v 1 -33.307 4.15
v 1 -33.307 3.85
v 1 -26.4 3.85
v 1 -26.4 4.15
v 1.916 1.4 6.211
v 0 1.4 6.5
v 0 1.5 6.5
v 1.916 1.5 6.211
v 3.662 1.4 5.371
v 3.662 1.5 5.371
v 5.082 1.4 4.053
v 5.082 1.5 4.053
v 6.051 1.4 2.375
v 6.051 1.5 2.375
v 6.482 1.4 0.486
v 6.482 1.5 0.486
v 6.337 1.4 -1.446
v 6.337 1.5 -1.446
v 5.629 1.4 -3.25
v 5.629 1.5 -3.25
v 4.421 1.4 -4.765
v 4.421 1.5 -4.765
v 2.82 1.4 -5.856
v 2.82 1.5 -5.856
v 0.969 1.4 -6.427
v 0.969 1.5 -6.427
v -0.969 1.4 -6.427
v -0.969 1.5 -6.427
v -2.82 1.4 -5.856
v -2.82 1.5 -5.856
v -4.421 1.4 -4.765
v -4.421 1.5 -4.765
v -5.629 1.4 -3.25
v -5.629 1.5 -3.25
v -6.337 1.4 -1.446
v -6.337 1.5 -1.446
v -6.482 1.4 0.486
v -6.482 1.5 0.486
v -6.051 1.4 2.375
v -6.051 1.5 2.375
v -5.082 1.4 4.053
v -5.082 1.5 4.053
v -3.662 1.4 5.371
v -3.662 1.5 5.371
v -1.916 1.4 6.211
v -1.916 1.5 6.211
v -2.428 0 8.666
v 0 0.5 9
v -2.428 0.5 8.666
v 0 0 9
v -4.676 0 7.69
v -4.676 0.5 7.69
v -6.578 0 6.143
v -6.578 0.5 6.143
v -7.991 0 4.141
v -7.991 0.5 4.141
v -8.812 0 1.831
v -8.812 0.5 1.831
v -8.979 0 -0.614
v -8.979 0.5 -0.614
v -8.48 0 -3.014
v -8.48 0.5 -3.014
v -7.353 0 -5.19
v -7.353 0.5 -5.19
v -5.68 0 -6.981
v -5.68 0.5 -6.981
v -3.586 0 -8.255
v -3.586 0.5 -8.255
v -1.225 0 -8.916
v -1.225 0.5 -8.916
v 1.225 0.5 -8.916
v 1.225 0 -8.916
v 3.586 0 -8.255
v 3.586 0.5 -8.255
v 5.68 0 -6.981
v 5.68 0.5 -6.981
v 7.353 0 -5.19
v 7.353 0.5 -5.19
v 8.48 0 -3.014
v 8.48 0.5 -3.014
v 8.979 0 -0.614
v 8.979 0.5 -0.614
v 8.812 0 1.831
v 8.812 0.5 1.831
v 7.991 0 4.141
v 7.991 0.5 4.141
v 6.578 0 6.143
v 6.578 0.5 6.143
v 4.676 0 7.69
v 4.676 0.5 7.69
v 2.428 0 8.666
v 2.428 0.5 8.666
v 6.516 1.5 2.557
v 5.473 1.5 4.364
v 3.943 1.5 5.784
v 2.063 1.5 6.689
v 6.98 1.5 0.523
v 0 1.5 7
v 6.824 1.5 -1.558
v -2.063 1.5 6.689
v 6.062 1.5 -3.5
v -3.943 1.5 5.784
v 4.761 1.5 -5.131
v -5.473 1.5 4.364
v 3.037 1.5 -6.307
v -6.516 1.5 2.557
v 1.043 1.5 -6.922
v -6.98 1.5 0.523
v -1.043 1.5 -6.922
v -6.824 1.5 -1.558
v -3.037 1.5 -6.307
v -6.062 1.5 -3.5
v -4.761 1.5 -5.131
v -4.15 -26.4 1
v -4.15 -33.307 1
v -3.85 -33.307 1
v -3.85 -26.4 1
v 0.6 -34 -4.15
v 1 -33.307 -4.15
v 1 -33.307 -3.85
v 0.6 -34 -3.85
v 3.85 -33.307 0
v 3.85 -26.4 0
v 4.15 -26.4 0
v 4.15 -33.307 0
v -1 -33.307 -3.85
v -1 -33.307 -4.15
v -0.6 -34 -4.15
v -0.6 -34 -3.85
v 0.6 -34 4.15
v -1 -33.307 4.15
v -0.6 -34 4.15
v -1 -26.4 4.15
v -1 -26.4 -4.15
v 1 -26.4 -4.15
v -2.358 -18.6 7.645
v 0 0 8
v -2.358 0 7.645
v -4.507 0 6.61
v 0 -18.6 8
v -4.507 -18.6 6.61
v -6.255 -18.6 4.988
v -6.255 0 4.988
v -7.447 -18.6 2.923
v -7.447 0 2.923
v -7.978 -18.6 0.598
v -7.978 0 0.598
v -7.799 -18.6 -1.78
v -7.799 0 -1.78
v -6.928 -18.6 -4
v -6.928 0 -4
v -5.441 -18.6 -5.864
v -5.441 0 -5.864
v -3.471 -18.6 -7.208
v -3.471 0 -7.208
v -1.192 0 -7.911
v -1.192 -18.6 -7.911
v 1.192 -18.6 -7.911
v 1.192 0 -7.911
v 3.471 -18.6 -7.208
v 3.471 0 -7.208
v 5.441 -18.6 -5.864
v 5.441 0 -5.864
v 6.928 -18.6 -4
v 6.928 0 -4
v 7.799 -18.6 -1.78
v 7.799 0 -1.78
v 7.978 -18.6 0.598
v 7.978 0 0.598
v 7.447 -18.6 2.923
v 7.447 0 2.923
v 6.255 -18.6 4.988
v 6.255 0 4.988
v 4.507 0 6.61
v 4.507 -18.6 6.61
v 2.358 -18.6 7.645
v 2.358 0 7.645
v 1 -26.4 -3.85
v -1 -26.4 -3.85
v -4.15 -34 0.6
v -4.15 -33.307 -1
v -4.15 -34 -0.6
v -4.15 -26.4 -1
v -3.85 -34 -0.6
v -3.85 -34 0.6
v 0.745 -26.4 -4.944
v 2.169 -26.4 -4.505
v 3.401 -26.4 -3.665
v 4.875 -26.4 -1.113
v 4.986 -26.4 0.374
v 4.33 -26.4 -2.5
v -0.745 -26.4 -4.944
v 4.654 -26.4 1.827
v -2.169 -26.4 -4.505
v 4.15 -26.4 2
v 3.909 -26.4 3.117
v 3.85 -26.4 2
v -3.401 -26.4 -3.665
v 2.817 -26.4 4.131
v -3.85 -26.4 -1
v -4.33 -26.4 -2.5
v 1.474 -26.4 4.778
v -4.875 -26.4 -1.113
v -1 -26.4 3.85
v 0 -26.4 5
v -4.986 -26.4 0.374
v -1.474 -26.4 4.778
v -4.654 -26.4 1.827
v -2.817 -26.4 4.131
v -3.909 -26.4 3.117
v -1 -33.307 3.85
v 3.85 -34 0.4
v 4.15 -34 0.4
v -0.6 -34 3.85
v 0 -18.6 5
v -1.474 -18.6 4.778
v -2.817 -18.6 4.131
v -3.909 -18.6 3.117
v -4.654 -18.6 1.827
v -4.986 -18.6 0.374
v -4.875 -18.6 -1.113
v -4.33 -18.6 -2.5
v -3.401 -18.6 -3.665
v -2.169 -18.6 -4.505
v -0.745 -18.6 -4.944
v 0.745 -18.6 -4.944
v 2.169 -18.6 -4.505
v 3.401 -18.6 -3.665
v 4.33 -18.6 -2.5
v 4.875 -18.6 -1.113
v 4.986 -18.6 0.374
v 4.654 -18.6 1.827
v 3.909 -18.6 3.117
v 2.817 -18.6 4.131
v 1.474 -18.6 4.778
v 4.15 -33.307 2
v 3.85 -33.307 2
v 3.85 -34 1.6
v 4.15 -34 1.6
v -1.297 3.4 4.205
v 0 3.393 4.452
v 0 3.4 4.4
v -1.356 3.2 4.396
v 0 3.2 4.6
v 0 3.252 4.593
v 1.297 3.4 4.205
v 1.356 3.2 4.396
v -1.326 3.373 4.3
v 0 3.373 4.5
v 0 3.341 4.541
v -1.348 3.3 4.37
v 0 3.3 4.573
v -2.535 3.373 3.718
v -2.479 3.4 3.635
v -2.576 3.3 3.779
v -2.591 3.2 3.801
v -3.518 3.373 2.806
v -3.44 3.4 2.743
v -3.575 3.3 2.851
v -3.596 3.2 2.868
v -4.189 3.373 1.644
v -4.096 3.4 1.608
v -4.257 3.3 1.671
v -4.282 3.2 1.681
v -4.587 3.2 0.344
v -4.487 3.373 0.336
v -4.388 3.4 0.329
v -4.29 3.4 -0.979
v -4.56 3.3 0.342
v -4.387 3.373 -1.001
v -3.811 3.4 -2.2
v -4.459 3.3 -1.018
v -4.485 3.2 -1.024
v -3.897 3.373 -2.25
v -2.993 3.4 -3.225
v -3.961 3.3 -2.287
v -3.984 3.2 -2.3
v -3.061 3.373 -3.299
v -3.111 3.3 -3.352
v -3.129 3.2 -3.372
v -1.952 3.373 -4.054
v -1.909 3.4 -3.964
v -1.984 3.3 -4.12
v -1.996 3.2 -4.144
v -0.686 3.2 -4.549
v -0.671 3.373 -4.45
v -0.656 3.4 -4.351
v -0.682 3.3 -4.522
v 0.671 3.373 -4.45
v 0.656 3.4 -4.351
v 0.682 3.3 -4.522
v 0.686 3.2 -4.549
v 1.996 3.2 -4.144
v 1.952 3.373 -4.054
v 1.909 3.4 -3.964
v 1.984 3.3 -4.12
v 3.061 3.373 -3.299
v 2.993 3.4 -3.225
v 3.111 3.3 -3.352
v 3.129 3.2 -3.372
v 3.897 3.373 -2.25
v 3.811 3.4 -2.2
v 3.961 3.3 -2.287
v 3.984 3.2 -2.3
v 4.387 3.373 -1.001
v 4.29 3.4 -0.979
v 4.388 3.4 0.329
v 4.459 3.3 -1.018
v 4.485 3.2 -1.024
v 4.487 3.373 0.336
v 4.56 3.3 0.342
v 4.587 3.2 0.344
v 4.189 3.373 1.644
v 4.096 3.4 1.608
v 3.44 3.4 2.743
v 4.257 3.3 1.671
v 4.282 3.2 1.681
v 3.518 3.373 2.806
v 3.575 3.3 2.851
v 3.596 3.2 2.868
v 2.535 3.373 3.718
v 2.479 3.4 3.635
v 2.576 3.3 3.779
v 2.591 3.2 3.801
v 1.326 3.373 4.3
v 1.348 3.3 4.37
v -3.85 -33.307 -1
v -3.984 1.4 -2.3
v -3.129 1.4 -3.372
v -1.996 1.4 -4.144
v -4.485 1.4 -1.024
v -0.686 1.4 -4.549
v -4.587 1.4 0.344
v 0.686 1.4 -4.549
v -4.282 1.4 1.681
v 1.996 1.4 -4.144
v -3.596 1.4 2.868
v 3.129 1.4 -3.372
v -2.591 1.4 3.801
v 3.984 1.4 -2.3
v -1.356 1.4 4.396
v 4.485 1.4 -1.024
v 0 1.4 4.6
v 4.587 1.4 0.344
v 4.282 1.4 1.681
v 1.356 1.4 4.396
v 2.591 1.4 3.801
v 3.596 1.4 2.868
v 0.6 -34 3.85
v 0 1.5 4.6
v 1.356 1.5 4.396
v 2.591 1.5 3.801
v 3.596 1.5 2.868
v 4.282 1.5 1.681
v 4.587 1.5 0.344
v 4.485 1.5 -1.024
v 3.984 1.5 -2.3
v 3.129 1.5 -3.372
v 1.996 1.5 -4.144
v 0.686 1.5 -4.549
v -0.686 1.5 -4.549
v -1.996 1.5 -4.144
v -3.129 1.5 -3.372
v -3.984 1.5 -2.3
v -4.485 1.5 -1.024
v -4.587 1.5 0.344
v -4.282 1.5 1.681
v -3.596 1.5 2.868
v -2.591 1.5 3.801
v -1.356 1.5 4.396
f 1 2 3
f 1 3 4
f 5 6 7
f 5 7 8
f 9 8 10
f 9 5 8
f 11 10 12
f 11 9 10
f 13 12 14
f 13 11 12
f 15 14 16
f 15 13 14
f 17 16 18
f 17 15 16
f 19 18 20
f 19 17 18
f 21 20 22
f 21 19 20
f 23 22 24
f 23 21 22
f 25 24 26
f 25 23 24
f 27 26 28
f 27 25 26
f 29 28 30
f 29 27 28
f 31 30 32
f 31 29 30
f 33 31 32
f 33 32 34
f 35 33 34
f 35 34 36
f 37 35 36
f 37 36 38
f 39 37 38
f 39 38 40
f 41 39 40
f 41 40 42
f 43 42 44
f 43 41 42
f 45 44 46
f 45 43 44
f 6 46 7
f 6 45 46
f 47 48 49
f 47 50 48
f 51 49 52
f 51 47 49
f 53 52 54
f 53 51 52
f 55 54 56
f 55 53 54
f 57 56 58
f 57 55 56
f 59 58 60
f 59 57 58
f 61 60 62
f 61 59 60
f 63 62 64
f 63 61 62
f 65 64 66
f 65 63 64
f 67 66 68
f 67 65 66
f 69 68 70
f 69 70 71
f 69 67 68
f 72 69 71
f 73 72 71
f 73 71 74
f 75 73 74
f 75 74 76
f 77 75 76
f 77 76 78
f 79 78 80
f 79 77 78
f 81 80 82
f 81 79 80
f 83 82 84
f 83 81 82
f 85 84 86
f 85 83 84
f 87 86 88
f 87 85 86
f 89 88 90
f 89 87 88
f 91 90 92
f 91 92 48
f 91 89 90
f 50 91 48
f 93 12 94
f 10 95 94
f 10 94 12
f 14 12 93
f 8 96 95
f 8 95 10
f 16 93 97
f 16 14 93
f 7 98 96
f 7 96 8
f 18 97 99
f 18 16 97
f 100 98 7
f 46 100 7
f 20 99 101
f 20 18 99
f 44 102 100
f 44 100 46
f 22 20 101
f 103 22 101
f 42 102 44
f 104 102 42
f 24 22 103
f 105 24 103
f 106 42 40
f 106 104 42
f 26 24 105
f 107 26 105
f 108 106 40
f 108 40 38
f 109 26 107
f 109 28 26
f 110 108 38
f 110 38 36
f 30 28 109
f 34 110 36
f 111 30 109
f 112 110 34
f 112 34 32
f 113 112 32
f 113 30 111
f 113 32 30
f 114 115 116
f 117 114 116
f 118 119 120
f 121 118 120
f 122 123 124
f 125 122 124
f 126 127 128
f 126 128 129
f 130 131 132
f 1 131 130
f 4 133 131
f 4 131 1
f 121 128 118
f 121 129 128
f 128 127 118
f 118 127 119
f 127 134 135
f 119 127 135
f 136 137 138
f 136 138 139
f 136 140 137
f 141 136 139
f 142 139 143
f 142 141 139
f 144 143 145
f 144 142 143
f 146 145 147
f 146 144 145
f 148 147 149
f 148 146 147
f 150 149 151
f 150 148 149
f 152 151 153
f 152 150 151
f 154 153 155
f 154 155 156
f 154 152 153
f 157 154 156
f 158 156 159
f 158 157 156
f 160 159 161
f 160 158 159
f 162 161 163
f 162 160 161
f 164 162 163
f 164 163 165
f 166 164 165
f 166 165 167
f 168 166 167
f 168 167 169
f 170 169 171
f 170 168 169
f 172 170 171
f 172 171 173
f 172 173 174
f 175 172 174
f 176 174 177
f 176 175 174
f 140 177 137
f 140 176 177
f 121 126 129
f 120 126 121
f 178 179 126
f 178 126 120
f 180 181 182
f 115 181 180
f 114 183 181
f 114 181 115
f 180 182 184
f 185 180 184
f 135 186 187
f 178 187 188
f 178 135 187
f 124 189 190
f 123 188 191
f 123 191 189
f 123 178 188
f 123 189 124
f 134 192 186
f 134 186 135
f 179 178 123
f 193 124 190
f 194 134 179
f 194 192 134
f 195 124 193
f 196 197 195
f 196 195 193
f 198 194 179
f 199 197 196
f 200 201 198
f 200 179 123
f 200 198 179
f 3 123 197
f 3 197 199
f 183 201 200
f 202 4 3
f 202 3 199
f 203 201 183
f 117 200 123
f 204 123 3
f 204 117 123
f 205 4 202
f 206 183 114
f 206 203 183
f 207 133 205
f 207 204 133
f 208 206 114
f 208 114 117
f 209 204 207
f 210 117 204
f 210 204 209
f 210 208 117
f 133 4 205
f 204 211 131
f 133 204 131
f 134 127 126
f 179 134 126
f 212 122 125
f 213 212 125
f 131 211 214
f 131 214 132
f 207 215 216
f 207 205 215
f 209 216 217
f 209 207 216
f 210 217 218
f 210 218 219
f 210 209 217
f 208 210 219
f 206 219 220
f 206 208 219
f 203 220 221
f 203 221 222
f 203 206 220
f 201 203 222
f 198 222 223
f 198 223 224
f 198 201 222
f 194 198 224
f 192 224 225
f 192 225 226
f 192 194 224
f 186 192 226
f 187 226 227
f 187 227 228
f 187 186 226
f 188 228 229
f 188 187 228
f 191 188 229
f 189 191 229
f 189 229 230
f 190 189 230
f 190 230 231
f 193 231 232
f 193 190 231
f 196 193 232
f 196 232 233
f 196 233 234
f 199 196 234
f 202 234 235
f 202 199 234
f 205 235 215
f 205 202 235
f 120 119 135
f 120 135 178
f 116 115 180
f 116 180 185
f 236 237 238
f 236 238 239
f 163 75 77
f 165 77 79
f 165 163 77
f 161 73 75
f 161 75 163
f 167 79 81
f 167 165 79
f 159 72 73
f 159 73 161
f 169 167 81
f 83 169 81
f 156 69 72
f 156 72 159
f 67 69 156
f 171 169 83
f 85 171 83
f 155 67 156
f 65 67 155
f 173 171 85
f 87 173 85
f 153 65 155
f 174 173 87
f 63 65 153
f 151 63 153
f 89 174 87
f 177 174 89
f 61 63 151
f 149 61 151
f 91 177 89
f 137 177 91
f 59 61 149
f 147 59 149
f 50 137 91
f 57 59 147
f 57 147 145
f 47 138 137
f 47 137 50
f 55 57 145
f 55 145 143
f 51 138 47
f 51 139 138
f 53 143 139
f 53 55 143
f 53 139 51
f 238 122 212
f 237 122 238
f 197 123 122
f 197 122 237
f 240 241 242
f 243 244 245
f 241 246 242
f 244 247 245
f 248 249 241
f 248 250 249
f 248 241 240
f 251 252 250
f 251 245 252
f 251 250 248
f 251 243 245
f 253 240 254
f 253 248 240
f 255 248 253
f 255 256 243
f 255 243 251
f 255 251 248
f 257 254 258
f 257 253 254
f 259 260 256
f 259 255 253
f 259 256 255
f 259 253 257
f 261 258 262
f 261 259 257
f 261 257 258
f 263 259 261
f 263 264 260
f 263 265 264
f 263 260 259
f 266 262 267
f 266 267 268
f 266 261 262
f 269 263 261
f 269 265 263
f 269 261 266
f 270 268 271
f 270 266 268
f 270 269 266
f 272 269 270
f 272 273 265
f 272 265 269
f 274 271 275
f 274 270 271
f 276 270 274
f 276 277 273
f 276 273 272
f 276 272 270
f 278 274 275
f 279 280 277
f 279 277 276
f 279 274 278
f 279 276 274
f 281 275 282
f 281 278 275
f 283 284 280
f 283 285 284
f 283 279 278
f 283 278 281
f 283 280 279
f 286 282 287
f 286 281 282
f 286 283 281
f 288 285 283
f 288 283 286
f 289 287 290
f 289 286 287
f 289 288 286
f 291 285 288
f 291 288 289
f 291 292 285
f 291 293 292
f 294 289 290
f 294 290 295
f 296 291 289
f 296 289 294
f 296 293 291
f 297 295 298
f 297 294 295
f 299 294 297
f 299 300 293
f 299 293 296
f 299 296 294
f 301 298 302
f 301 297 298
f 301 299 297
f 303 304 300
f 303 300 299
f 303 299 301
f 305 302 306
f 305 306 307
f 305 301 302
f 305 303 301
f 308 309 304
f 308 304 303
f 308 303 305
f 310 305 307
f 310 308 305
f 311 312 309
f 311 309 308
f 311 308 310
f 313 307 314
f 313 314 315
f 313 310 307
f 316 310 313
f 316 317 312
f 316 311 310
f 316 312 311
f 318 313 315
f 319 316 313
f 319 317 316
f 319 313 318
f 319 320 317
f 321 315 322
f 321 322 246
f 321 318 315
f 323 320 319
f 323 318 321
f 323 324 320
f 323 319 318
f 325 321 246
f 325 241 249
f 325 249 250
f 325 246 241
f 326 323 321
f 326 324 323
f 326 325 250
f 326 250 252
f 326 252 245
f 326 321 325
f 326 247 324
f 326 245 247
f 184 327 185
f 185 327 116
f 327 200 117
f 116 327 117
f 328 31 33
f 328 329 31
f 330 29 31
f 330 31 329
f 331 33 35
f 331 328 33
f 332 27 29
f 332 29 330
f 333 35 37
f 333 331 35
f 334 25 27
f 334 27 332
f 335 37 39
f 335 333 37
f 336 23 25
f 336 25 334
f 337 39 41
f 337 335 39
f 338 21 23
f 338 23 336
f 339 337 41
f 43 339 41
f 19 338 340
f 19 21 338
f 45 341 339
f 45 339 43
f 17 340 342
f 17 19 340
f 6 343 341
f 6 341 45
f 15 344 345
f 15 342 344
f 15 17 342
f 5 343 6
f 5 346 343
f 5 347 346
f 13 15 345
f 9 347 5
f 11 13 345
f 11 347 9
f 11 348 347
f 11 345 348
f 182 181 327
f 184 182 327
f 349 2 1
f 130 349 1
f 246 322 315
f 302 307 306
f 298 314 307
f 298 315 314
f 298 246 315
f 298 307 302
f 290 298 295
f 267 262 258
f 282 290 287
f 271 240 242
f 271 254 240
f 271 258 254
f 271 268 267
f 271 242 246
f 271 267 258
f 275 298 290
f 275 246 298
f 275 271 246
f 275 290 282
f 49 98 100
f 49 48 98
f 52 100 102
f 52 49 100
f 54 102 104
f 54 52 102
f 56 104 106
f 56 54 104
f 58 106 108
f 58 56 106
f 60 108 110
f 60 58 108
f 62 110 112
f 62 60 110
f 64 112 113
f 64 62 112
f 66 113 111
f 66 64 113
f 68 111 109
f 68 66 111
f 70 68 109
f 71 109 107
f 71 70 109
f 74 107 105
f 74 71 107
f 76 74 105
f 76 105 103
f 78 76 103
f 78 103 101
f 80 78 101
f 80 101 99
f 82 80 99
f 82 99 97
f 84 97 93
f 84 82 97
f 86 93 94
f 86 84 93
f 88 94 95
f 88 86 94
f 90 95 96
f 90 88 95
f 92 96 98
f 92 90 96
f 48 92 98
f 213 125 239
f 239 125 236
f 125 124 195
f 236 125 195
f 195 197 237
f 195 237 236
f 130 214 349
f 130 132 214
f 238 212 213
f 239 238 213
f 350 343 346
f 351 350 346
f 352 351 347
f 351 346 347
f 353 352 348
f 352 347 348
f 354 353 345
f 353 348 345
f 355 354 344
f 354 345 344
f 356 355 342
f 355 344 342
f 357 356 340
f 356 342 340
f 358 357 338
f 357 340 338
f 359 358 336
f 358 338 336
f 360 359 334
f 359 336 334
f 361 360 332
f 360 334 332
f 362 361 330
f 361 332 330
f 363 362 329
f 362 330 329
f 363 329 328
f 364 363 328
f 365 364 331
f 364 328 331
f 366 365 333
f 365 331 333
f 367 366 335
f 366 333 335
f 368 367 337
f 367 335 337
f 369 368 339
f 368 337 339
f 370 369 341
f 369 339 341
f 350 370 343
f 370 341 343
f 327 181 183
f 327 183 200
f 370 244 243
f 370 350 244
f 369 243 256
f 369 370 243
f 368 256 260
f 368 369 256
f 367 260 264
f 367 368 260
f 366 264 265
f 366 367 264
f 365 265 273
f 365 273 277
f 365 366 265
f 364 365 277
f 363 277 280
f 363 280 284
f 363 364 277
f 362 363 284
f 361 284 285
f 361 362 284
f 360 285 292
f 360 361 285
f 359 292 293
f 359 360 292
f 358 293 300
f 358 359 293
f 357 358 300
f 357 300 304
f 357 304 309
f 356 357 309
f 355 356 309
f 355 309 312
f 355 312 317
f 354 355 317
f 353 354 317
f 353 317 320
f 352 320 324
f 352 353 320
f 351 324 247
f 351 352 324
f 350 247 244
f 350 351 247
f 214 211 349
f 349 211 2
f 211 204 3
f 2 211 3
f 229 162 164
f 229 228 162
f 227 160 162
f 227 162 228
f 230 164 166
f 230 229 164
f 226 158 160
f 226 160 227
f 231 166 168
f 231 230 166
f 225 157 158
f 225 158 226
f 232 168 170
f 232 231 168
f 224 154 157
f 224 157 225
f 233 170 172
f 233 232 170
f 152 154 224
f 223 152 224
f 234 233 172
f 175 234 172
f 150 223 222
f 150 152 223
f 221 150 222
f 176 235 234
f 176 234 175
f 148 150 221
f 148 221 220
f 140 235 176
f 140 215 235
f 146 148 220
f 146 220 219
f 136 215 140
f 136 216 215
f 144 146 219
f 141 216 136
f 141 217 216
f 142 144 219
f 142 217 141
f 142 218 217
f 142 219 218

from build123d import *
from OCP.BRepFilletAPI import BRepFilletAPI_MakeChamfer

# Parameters (mm, degrees)
FILLET1_R           = 0.2
CUT_EXTRUDE1_START  = -0.1
SKETCH2_R           = 6.5
SKETCH2_R_2         = 4.6
CUT_EXTRUDE1_DEPTH  = 0.1
SKETCH3_W           = 2
SKETCH3_H           = 0.3
SKETCH3_W_2         = 0.3
SKETCH3_H_2         = 2
EXTRUDE_THIN1_DEPTH = 7.6
CHAMFER1_SIZE       = 0.4
CHAMFER1_SIZE2      = 0.692820323


with BuildPart() as part:
    # Sketch1 → Revolve1 (revolve)
    with BuildSketch(Plane(origin=(0, 0, 0), x_dir=(0, 0, -1), z_dir=(1, 0, 0))):
        Polygon((0, 3.4), (-4.6, 3.4), (-4.6, 1.5), (-7, 1.5), (-9, 0.5), (-9, 0), (-8, 0), (-8, -18.6), (-5, -18.6), (-5, -26.4), (0, -26.4), align=None)
    revolve(axis=Axis((0, 14.375, 0), (0, -1, 0)))

    # Fillet1
    fillet1_edges = [part.edges().sort_by_distance(p)[0] for p in [
        (0, 3.4, -4.6),
    ]]
    fillet(fillet1_edges, radius=FILLET1_R)

    # Sketch2 → Cut-Extrude1 (cut)
    with BuildSketch(Plane(origin=(0, 1.5, 0), x_dir=(1, 0, 0), z_dir=(0, 1, 0)).offset(CUT_EXTRUDE1_START)):
        with Locations(Location((0, 0, 0), (0, 0, 270))):
            Circle(SKETCH2_R)
        with Locations(Location((0, 0, 0), (0, 0, 270))):
            Circle(SKETCH2_R_2, mode=Mode.SUBTRACT)
    extrude(amount=CUT_EXTRUDE1_DEPTH, mode=Mode.SUBTRACT)

    # Sketch3 → Extrude-Thin1 (add)
    with BuildSketch(Plane.XZ.offset(26.4)):
        with Locations((0, 4)):
            Rectangle(SKETCH3_W, SKETCH3_H)
        with Locations((0, -4)):
            Rectangle(SKETCH3_W, SKETCH3_H)
        with Locations((-4, 0)):
            Rectangle(SKETCH3_W_2, SKETCH3_H_2)
        with Locations((4, 1)):
            Rectangle(SKETCH3_W_2, SKETCH3_H_2)
    extrude(amount=EXTRUDE_THIN1_DEPTH)

    # Chamfer1: one chamfer whose edges measure the first distance from different faces: ONE call of the kernel's chamfer builder (chamfer() names one face for all edges)
    chamfer1_edges_1 = [part.edges().sort_by_distance(p)[0] for p in [
        (1, -34, 4),
        (-1, -34, 4),
    ]]
    chamfer1_side_1 = [part.faces().sort_by_distance(p)[0] for p in [
        (0, -34, 4),
    ]]
    chamfer1_edges_2 = [part.edges().sort_by_distance(p)[0] for p in [
        (1, -34, -4),
        (-1, -34, -4),
    ]]
    chamfer1_side_2 = [part.faces().sort_by_distance(p)[0] for p in [
        (0, -34, -4),
    ]]
    chamfer1_edges_3 = [part.edges().sort_by_distance(p)[0] for p in [
        (-4, -34, -1),
        (-4, -34, 1),
    ]]
    chamfer1_side_3 = [part.faces().sort_by_distance(p)[0] for p in [
        (-4, -34, 0),
    ]]
    chamfer1_edges_4 = [part.edges().sort_by_distance(p)[0] for p in [
        (4, -34, 2),
        (4, -34, 0),
    ]]
    chamfer1_side_4 = [part.faces().sort_by_distance(p)[0] for p in [
        (4, -34, 1),
    ]]
    chamfer1 = BRepFilletAPI_MakeChamfer(part.part.solid().wrapped)
    for e in chamfer1_edges_1:
        chamfer1.Add(CHAMFER1_SIZE, CHAMFER1_SIZE2, e.wrapped, chamfer1_side_1[0].wrapped)  # the first distance lies on this face
    for e in chamfer1_edges_2:
        chamfer1.Add(CHAMFER1_SIZE, CHAMFER1_SIZE2, e.wrapped, chamfer1_side_2[0].wrapped)  # the first distance lies on this face
    for e in chamfer1_edges_3:
        chamfer1.Add(CHAMFER1_SIZE, CHAMFER1_SIZE2, e.wrapped, chamfer1_side_3[0].wrapped)  # the first distance lies on this face
    for e in chamfer1_edges_4:
        chamfer1.Add(CHAMFER1_SIZE, CHAMFER1_SIZE2, e.wrapped, chamfer1_side_4[0].wrapped)  # the first distance lies on this face
    add(Compound.cast(chamfer1.Shape()), mode=Mode.REPLACE)


solid = part.part
